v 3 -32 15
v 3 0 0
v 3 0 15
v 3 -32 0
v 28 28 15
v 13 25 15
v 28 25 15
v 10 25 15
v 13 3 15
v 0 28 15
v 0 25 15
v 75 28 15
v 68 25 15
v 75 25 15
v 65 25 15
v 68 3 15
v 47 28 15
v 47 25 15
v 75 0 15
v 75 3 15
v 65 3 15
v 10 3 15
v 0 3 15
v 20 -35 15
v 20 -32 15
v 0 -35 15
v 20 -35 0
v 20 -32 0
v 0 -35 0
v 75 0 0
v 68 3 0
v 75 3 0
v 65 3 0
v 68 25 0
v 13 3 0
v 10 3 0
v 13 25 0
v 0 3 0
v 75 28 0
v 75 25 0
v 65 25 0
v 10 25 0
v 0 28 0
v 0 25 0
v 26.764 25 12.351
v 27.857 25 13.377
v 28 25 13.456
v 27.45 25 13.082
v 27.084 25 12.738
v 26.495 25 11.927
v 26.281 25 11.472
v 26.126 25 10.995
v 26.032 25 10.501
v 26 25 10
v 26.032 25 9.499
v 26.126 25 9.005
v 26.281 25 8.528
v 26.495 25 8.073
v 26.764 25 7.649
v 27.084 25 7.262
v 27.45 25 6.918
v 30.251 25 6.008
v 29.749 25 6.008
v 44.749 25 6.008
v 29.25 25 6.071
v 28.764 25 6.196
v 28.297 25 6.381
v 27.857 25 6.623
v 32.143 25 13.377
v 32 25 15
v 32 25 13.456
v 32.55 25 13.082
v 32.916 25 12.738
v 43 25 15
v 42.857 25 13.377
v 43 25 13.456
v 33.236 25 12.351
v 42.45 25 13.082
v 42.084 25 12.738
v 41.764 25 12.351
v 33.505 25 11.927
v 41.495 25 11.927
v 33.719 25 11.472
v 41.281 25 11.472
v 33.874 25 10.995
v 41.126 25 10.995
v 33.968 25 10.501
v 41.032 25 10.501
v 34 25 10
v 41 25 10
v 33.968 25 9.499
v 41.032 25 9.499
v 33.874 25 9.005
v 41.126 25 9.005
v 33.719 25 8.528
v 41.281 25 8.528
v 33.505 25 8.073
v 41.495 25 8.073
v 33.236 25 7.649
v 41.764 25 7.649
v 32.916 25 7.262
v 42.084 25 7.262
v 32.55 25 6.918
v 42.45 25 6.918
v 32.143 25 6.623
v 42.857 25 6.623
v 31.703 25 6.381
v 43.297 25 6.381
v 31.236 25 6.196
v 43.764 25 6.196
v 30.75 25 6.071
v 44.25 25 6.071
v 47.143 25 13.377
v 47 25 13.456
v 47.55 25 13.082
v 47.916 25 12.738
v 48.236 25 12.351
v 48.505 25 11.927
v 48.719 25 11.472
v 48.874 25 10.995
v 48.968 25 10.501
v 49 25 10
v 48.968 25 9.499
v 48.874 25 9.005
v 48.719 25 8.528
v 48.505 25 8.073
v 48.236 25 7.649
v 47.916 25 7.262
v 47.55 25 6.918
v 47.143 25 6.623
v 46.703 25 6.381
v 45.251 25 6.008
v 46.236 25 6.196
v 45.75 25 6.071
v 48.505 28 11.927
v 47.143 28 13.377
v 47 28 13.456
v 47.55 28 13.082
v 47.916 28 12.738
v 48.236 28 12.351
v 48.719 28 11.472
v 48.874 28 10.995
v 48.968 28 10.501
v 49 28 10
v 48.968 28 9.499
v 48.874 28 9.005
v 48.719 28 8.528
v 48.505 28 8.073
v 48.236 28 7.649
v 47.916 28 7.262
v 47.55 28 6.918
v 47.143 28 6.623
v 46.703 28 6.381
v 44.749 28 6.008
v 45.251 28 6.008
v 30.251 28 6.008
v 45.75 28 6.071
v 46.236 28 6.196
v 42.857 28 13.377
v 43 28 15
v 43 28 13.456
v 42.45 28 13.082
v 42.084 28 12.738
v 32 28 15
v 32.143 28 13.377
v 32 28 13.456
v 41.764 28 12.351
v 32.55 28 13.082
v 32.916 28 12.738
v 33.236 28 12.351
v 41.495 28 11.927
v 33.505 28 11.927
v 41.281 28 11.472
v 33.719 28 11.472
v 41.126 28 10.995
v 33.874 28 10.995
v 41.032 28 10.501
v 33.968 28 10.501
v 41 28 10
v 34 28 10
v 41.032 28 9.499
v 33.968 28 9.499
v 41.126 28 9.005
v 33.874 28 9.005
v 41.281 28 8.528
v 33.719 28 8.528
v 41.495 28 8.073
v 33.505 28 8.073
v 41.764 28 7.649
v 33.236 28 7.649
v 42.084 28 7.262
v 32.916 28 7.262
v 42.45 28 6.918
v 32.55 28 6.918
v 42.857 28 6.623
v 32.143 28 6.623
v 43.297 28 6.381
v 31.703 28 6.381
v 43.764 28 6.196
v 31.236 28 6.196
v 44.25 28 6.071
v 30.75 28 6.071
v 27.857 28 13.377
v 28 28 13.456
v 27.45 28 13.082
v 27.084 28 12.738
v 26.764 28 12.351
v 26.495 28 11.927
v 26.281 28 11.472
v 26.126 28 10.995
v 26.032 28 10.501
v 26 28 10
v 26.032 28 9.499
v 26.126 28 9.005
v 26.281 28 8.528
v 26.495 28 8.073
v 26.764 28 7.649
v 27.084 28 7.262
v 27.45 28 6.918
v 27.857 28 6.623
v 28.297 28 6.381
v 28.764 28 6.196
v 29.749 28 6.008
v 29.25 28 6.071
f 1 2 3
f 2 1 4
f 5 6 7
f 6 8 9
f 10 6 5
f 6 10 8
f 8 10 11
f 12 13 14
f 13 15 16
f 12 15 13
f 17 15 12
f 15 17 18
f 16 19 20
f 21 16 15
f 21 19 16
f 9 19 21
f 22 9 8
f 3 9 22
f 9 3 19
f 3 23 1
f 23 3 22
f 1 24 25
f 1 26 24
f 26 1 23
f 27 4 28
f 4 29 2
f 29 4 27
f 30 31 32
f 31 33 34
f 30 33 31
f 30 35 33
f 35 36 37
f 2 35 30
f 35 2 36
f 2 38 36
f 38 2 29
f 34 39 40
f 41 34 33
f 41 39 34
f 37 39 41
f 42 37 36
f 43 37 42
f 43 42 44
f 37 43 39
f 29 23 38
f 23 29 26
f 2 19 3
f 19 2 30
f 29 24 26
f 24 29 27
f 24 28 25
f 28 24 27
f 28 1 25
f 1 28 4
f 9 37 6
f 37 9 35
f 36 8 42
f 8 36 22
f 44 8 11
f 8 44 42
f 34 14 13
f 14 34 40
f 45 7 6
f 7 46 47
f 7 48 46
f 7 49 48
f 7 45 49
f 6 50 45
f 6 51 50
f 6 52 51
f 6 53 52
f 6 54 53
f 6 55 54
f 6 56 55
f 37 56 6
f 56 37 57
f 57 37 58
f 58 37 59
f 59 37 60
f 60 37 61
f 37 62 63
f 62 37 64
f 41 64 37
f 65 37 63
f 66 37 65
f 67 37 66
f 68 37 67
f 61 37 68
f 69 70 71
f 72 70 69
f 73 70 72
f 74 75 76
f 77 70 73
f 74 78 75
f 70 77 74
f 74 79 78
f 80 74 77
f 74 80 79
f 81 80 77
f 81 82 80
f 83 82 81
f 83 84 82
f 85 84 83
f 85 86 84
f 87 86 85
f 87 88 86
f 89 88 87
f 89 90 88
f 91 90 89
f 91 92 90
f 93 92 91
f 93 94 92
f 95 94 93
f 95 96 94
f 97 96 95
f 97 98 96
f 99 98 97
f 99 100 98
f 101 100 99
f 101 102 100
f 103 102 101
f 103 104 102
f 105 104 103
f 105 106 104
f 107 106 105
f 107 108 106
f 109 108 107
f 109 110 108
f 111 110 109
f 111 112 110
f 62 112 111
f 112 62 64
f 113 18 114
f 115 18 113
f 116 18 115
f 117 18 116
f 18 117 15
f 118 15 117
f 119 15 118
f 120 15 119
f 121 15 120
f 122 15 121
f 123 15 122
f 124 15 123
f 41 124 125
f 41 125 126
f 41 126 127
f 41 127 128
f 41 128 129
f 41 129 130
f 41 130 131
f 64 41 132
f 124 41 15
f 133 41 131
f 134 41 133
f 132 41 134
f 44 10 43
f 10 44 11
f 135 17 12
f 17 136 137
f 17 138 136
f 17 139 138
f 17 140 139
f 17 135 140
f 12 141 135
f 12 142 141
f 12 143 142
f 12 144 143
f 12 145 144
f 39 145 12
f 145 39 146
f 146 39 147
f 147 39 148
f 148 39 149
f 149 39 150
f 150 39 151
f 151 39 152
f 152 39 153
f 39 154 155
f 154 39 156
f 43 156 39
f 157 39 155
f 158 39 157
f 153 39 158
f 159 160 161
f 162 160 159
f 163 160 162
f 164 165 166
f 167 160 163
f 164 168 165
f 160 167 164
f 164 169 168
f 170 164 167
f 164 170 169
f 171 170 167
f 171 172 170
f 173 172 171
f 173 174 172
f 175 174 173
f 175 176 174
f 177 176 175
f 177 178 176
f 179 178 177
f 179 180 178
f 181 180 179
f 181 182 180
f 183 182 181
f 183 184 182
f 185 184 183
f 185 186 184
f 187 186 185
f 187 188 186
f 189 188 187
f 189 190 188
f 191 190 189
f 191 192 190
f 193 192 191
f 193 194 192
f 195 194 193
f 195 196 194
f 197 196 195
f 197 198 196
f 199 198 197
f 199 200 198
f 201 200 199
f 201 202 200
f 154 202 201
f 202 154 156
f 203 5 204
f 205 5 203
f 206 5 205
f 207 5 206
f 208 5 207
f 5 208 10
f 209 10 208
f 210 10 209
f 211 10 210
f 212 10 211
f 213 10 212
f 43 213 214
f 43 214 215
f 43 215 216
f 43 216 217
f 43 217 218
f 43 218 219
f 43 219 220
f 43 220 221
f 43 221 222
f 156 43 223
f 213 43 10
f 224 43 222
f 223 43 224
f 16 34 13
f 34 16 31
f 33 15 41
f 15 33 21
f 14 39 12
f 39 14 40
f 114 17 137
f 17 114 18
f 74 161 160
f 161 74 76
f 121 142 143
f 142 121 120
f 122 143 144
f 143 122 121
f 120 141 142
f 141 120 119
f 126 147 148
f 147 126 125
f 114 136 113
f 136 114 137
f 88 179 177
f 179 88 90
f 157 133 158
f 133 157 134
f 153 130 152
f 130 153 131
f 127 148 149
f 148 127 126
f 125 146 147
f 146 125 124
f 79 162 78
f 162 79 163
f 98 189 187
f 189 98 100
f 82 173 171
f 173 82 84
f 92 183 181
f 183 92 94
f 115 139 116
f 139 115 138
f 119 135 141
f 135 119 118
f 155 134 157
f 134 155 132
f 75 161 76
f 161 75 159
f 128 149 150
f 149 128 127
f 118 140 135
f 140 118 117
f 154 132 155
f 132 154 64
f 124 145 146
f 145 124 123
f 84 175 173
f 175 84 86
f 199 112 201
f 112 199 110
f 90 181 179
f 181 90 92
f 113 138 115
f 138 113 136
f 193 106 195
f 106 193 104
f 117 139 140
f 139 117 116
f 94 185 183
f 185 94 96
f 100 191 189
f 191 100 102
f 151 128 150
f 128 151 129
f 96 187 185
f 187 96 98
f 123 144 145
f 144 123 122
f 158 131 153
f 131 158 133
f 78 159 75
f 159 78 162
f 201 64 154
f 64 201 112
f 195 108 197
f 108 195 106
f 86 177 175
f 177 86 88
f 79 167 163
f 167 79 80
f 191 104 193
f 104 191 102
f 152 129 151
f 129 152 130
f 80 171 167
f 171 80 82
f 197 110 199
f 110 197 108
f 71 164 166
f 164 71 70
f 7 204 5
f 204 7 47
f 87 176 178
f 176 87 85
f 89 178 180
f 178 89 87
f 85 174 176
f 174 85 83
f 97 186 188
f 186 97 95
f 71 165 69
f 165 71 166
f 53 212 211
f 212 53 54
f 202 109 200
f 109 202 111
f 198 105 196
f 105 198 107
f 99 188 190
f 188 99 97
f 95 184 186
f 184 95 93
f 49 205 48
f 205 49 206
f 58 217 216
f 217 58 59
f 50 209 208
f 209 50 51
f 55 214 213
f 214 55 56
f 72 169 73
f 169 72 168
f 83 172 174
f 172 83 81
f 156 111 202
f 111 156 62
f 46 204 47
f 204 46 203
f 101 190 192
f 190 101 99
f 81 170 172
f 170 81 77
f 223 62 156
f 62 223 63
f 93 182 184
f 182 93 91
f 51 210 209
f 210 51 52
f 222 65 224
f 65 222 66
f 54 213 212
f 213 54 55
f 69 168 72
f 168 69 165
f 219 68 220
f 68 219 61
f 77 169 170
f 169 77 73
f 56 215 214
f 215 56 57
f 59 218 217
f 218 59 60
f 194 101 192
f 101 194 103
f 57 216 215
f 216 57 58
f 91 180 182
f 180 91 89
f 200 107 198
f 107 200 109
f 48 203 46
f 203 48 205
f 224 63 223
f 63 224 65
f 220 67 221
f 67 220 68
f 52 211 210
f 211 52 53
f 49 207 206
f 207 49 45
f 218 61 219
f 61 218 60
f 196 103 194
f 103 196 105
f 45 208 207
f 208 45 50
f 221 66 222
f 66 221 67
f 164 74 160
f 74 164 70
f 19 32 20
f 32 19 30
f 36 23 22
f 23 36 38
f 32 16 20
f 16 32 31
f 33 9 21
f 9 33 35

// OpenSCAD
wall = 3;
height = 15;
wire = 4;

complete();
//wire_holder(wall, height, wire);
module complete()
{
	translate([0, -35, 0]) {
		monitor_hook(wall, height);
	}

	main_beam(wall, height);

	translate([10, 0, 0]) {
		top_L(wall, height);
	}

	translate([65, 0, 0]) {
		bottom_L(wall, height);
	}

	translate([0, 25, 0]) {
		wire_holder(wall, height, wire);
	}

}

module main_beam(wall, height)
{
	cube([75, wall, height]);
}

module monitor_hook(wall, height)
{
	cube([wall, 35, height]);
	cube([20, wall, height]);
}

module top_L(wall, height)
{
	cube([wall, 25, height]);
	translate([-10, 25, 0]) {
		cube([10 + wall, wall, height]);
	}
}

module bottom_L(wall, height)
{
	cube([wall, 25, height]);
	translate([0, 25, 0]) {
		cube([10, wall, height]);
	}
}

module wire_holder(wall, height, wire)
{
	difference()
	{
		main_beam(wall, height);

		translate([45, wall * 1.5, height - 5]) {
			keyhole(wall * 2, wire);
		}
		translate([30, wall * 1.5, height - 5]) {
			keyhole(wall * 2, wire);
		}
	}
}


module keyhole(wall, entrance_width)
{
	hole_diameter = entrance_width * 2;
	translate([- hole_diameter / 4, -wall, 0]) {
		cube([entrance_width, wall, hole_diameter]);
	}
	rotate([90, 0, 0]) {
		cylinder(r = hole_diameter / 2, h = wall, $fn = 50 );
	}
}
